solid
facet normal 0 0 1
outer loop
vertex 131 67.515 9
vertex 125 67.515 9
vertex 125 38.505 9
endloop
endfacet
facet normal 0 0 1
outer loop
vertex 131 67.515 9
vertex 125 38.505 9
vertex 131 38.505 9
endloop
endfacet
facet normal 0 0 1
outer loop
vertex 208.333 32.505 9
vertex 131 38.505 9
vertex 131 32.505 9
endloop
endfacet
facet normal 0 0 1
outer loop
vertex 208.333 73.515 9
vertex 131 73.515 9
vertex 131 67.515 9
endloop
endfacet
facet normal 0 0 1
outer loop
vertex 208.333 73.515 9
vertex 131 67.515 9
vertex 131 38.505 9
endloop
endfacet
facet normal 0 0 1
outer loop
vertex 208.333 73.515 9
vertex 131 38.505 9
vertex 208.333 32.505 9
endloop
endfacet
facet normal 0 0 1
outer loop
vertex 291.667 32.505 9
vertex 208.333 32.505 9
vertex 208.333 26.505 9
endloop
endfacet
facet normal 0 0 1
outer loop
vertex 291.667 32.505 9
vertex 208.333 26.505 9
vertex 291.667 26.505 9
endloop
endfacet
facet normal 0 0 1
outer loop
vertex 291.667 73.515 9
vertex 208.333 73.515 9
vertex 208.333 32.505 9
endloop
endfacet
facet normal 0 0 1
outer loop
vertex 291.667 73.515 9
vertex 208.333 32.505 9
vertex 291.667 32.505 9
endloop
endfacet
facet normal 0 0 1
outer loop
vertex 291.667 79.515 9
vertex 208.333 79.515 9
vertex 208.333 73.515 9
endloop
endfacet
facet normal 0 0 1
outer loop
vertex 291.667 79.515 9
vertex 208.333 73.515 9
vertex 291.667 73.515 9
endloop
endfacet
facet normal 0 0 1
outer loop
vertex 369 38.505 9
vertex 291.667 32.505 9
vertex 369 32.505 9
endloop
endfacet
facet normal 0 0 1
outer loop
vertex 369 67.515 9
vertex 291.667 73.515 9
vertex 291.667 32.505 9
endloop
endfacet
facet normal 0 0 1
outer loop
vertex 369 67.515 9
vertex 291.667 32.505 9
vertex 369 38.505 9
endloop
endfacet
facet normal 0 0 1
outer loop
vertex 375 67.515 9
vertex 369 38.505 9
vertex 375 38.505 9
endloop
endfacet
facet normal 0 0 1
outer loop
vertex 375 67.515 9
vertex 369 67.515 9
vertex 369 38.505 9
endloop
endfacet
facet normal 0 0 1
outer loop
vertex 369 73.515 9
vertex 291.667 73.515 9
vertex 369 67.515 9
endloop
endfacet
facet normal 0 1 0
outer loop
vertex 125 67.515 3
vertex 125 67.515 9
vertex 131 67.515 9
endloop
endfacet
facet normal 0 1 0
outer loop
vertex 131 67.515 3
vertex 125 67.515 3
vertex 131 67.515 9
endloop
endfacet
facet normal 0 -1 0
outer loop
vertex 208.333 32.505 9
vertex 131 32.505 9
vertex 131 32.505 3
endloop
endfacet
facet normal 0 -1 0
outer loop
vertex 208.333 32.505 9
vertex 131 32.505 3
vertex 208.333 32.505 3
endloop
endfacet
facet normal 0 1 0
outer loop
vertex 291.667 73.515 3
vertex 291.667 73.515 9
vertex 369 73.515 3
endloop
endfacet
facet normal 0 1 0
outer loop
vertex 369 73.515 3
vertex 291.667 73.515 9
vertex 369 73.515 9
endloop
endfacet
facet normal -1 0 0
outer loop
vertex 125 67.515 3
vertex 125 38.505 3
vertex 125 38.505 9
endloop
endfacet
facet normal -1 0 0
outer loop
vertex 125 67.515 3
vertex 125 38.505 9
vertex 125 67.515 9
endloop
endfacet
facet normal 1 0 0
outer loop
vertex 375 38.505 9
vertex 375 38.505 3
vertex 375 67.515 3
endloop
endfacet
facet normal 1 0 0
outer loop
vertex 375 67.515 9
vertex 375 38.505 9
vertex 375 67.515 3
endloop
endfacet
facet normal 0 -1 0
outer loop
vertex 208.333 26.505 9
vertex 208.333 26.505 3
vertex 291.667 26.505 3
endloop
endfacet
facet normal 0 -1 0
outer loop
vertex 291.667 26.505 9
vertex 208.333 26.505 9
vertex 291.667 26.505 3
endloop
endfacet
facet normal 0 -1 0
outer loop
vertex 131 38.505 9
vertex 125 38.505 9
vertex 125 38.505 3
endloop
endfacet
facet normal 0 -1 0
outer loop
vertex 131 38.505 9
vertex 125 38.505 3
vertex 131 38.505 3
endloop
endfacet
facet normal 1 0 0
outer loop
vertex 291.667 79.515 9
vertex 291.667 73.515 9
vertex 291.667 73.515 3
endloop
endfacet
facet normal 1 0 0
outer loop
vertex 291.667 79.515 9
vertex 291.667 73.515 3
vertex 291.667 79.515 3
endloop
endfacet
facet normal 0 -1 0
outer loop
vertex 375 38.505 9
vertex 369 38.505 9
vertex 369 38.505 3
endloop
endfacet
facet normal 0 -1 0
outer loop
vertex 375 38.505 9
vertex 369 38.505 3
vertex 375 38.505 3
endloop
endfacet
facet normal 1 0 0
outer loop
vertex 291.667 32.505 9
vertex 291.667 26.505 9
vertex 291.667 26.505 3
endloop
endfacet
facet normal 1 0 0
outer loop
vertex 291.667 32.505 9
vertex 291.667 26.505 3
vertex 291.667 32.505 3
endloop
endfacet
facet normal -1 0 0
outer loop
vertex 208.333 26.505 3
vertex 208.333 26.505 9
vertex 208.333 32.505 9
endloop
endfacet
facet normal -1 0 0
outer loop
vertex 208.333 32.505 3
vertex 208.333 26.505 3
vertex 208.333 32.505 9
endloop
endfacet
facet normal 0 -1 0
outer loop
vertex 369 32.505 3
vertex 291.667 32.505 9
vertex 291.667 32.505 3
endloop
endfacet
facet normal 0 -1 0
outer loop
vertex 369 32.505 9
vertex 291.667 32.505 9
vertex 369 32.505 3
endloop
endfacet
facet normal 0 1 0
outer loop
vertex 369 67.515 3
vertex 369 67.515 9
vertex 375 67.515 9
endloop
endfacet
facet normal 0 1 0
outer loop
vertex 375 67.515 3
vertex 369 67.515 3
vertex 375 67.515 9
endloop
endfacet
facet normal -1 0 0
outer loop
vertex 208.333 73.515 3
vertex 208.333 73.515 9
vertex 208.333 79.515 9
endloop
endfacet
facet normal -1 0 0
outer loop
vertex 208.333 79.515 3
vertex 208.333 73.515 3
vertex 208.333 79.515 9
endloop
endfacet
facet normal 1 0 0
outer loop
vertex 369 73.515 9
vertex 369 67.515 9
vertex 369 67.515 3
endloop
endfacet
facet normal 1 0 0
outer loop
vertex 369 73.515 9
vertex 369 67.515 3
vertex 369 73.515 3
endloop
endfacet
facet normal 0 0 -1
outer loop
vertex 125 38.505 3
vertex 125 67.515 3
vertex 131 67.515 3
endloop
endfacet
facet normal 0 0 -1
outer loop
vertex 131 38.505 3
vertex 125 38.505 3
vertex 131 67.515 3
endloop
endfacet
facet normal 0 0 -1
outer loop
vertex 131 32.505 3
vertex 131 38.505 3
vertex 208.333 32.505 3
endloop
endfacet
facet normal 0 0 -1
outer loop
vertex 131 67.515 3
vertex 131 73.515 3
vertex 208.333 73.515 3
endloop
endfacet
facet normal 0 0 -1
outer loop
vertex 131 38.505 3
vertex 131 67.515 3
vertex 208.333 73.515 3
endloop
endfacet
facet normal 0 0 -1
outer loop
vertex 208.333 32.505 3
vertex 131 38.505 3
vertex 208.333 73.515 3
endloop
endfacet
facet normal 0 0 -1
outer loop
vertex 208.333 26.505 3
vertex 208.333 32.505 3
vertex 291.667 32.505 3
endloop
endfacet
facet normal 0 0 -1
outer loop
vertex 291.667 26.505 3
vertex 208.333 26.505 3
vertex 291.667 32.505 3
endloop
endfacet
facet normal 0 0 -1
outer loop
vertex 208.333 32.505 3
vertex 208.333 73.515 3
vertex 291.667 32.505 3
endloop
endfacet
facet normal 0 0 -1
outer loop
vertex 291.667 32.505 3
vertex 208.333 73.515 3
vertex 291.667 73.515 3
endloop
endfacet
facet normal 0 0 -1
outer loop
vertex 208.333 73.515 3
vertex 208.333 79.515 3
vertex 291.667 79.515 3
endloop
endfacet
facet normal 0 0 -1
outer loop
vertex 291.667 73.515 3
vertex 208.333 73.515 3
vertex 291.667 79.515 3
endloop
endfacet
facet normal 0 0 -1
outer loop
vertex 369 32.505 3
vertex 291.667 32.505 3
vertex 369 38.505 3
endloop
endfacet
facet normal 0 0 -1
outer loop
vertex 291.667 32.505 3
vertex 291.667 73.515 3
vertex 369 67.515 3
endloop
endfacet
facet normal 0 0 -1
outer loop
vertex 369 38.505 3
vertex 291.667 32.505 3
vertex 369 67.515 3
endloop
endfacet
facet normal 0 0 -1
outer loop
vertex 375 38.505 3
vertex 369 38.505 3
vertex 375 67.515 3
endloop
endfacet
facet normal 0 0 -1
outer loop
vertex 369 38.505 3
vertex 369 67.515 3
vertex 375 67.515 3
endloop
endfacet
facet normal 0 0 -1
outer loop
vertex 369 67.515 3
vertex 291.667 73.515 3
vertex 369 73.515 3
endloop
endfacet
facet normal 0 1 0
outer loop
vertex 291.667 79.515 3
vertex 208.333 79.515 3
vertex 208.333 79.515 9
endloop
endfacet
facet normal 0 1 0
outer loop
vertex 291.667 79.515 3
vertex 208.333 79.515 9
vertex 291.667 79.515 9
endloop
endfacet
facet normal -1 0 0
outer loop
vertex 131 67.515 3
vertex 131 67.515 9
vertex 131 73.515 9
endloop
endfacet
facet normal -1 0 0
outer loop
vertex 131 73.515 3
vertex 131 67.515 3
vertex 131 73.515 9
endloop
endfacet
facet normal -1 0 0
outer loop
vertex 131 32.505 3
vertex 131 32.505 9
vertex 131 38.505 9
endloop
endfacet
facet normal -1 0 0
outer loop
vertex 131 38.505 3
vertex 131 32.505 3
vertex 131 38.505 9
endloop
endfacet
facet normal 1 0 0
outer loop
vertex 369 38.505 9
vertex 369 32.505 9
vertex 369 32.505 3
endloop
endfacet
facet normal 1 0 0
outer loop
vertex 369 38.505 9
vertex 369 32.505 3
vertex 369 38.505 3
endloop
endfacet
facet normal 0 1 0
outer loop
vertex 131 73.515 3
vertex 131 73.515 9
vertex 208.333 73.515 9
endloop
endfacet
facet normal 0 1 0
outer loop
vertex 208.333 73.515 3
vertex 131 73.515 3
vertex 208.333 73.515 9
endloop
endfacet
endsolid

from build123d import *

# Parameters (mm, degrees)
SKETCH1_W           = 500
SKETCH1_H           = 106.02
BOSS_EXTRUDE1_DEPTH = 12
SKETCH2_W           = 12
SKETCH2_H           = 24
CUT_EXTRUDE1_DEPTH  = 512.257508894
SKETCH3_W           = 154.666666667
SKETCH3_H           = 12
CUT_EXTRUDE2_DEPTH  = 512.257508894
SCALE1_SCALE        = 0.5


with BuildPart() as part:
    # Sketch1 → Boss-Extrude1 (new body)
    with BuildSketch(Plane.XY):
        with Locations((250, 53.01)):
            Rectangle(SKETCH1_W, SKETCH1_H)
    extrude(amount=BOSS_EXTRUDE1_DEPTH)

    # Sketch2 → Cut-Extrude1 (cut, through all)
    with BuildSketch(Plane.XY.offset(12)):
        with Locations((494, 12)):
            Rectangle(SKETCH2_W, SKETCH2_H)
        with Locations((494, 94.02)):
            Rectangle(SKETCH2_W, SKETCH2_H)
        with Locations((6, 94.02)):
            Rectangle(SKETCH2_W, SKETCH2_H)
        with Locations((6, 12)):
            Rectangle(SKETCH2_W, SKETCH2_H)
    extrude(amount=-CUT_EXTRUDE1_DEPTH, mode=Mode.SUBTRACT)

    # Sketch3 → Cut-Extrude2 (cut, through all)
    with BuildSketch(Plane.XY.offset(12)):
        with Locations((89.333333334, 6)):
            Rectangle(SKETCH3_W, SKETCH3_H)
        with Locations((410.666666667, 6)):
            Rectangle(SKETCH3_W, SKETCH3_H)
        with Locations((89.333333334, 100.02)):
            Rectangle(SKETCH3_W, SKETCH3_H)
        with Locations((410.666666667, 100.02)):
            Rectangle(SKETCH3_W, SKETCH3_H)
    extrude(amount=-CUT_EXTRUDE2_DEPTH, mode=Mode.SUBTRACT)


with BuildPart() as part_1:
    # Scale1: scaled about (250, 53.01, 6)
    add(part.part.scale(SCALE1_SCALE).moved(Location((125, 26.505, 3))))


solid = part_1.part
